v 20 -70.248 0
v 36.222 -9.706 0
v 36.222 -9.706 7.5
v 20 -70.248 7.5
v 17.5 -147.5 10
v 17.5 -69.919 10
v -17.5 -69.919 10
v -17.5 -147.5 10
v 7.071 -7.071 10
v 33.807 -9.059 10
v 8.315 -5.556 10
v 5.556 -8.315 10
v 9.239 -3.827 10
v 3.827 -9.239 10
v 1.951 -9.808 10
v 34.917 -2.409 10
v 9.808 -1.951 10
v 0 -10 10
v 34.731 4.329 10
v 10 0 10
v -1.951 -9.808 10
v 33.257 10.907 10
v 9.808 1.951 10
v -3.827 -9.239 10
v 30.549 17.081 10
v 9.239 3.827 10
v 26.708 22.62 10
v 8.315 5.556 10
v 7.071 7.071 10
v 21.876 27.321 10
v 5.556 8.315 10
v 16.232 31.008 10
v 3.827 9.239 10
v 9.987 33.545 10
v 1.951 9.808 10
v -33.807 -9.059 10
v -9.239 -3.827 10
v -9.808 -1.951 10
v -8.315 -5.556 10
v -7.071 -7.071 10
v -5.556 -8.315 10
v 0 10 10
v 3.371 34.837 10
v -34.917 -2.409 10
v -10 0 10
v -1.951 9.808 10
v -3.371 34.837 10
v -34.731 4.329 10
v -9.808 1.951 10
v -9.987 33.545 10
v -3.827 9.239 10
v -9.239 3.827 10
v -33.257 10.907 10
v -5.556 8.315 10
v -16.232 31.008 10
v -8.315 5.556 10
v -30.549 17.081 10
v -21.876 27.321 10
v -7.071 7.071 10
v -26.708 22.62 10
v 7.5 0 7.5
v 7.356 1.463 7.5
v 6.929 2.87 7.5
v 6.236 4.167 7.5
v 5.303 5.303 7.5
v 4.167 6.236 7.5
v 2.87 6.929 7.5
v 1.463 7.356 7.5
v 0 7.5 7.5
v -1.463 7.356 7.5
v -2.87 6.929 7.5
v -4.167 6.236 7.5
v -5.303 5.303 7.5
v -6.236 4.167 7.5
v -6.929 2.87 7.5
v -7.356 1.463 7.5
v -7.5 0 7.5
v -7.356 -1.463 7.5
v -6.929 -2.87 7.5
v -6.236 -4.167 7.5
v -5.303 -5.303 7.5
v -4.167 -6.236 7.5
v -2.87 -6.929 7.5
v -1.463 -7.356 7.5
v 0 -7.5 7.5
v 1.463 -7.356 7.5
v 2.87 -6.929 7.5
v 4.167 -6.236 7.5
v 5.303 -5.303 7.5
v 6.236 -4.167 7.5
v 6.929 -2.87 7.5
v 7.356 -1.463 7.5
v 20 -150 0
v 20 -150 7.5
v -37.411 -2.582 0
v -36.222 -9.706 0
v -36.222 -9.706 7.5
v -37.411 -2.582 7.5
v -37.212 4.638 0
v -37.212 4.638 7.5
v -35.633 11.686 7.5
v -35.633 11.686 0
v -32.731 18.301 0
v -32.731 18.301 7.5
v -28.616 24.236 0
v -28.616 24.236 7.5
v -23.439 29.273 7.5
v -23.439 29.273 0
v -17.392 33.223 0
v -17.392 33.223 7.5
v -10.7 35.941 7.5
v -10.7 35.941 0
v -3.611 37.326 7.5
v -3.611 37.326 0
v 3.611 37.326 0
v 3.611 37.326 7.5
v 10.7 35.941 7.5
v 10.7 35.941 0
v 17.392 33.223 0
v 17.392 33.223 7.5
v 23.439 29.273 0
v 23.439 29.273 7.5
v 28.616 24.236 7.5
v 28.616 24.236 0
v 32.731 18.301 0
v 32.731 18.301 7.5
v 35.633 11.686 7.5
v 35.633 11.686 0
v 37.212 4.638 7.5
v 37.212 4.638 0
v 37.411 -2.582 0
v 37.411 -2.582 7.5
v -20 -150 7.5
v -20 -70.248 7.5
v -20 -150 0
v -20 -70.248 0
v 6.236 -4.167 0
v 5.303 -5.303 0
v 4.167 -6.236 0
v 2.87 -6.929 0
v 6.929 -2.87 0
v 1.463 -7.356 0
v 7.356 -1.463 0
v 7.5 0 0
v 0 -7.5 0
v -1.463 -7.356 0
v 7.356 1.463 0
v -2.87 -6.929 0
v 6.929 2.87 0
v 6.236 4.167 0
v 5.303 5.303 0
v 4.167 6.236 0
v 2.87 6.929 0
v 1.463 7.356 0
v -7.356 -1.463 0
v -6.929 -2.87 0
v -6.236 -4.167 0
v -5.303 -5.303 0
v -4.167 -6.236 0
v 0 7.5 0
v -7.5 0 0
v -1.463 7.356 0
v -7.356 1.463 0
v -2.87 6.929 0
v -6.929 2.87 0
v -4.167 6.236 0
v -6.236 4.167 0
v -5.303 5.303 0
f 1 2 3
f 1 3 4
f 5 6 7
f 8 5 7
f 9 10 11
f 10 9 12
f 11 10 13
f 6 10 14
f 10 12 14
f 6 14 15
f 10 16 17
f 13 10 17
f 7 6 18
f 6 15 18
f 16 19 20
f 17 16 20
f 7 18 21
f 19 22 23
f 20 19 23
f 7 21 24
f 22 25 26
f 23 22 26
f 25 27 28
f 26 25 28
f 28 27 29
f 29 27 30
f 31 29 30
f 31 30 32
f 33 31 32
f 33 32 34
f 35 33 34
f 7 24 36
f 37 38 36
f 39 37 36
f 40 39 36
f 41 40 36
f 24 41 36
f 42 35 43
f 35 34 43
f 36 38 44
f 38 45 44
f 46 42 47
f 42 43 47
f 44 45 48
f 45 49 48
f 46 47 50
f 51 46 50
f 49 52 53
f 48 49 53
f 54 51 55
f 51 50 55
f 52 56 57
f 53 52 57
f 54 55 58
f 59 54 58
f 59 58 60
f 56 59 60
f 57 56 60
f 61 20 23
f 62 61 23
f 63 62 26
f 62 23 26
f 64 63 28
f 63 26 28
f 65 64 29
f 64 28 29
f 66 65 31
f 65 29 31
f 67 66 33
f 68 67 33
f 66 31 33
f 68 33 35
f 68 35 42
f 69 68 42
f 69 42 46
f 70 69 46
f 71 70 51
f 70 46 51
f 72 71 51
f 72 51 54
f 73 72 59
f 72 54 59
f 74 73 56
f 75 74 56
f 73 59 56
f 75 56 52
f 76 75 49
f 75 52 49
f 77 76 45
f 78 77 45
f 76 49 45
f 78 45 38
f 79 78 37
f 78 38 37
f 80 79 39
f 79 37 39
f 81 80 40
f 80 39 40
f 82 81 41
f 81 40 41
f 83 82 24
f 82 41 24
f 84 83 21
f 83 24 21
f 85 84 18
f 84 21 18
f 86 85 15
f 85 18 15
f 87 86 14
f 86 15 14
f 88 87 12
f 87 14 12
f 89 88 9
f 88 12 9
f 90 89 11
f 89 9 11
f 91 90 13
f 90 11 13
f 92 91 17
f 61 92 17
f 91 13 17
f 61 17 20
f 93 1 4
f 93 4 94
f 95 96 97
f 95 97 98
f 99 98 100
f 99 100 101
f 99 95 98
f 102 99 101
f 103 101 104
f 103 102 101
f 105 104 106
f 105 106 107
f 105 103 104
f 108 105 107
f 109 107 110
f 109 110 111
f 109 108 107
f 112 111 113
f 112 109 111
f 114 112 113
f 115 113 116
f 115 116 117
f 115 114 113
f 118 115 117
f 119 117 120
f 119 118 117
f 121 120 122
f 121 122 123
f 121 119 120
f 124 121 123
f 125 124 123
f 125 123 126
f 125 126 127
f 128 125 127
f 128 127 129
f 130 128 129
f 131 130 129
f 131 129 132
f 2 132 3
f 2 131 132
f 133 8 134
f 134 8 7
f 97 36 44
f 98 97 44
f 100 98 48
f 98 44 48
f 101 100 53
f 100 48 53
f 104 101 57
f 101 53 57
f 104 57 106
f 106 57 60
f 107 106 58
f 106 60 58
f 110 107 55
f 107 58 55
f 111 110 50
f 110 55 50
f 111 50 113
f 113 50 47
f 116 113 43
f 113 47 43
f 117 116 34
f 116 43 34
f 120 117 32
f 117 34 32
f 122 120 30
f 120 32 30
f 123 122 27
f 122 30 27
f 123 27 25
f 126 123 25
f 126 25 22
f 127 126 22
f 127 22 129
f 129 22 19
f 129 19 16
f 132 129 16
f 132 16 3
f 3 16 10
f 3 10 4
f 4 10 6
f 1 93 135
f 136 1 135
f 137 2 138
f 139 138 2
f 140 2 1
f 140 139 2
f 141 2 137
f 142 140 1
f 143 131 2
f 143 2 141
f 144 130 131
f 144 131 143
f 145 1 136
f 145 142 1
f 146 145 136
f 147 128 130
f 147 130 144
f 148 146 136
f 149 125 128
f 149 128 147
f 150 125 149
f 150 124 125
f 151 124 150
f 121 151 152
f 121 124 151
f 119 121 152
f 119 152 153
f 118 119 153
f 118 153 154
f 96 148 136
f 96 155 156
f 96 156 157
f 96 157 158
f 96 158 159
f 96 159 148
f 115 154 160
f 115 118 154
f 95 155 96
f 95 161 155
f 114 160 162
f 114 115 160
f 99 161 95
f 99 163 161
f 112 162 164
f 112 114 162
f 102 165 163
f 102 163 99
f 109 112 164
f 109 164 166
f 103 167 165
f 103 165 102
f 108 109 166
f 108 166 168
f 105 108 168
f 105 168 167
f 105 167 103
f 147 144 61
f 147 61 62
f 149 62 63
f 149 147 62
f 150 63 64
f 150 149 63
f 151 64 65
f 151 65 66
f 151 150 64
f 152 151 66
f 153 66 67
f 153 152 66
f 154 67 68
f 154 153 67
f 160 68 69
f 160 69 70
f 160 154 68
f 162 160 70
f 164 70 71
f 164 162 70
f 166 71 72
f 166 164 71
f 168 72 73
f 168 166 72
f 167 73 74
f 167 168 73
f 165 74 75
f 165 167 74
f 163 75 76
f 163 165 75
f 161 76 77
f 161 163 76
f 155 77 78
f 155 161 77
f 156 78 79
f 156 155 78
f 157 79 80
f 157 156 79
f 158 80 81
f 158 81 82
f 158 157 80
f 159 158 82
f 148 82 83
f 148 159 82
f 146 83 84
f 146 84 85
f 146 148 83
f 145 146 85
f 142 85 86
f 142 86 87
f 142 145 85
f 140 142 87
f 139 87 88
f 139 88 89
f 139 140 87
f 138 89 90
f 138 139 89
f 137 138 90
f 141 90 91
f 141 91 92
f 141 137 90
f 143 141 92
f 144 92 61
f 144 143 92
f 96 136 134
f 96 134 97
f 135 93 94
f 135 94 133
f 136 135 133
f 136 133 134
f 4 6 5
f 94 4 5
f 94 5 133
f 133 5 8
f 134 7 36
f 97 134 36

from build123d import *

# Parameters (mm, degrees)
SKETCH1_R           = 7.5
BOSS_EXTRUDE1_DEPTH = 10
CHAMFER1_SIZE       = 2.5


with BuildPart() as part:
    # Sketch1 → Boss-Extrude1 (new body)
    with BuildSketch(Plane.XY):
        with BuildLine():
            Line((36.222218486, -9.705714191), (20, -70.247857792))
            Line((20, -70.247857792), (20, -150))
            Line((20, -150), (-20, -150))
            Line((-20, -150), (-20, -70.247857792))
            Line((-20, -70.247857792), (-36.222218486, -9.705714191))
            ThreePointArc((-36.222218486, -9.705714191), (0, 37.5), (36.222218486, -9.705714191))
        make_face()
        Circle(SKETCH1_R, mode=Mode.SUBTRACT)
    extrude(amount=BOSS_EXTRUDE1_DEPTH)

    # Chamfer1
    chamfer1_edges = [part.edges().sort_by_distance(p)[0] for p in [
        (-20, -110.123928896, 10),
        (0, -150, 10),
        (-7.5, 0, 10),
        (20, -110.123928896, 10),
        (28.111109243, -39.976785992, 10),
        (0, 37.5, 10),
        (-28.111109243, -39.976785992, 10),
    ]]
    chamfer(chamfer1_edges, length=CHAMFER1_SIZE)


solid = part.part
